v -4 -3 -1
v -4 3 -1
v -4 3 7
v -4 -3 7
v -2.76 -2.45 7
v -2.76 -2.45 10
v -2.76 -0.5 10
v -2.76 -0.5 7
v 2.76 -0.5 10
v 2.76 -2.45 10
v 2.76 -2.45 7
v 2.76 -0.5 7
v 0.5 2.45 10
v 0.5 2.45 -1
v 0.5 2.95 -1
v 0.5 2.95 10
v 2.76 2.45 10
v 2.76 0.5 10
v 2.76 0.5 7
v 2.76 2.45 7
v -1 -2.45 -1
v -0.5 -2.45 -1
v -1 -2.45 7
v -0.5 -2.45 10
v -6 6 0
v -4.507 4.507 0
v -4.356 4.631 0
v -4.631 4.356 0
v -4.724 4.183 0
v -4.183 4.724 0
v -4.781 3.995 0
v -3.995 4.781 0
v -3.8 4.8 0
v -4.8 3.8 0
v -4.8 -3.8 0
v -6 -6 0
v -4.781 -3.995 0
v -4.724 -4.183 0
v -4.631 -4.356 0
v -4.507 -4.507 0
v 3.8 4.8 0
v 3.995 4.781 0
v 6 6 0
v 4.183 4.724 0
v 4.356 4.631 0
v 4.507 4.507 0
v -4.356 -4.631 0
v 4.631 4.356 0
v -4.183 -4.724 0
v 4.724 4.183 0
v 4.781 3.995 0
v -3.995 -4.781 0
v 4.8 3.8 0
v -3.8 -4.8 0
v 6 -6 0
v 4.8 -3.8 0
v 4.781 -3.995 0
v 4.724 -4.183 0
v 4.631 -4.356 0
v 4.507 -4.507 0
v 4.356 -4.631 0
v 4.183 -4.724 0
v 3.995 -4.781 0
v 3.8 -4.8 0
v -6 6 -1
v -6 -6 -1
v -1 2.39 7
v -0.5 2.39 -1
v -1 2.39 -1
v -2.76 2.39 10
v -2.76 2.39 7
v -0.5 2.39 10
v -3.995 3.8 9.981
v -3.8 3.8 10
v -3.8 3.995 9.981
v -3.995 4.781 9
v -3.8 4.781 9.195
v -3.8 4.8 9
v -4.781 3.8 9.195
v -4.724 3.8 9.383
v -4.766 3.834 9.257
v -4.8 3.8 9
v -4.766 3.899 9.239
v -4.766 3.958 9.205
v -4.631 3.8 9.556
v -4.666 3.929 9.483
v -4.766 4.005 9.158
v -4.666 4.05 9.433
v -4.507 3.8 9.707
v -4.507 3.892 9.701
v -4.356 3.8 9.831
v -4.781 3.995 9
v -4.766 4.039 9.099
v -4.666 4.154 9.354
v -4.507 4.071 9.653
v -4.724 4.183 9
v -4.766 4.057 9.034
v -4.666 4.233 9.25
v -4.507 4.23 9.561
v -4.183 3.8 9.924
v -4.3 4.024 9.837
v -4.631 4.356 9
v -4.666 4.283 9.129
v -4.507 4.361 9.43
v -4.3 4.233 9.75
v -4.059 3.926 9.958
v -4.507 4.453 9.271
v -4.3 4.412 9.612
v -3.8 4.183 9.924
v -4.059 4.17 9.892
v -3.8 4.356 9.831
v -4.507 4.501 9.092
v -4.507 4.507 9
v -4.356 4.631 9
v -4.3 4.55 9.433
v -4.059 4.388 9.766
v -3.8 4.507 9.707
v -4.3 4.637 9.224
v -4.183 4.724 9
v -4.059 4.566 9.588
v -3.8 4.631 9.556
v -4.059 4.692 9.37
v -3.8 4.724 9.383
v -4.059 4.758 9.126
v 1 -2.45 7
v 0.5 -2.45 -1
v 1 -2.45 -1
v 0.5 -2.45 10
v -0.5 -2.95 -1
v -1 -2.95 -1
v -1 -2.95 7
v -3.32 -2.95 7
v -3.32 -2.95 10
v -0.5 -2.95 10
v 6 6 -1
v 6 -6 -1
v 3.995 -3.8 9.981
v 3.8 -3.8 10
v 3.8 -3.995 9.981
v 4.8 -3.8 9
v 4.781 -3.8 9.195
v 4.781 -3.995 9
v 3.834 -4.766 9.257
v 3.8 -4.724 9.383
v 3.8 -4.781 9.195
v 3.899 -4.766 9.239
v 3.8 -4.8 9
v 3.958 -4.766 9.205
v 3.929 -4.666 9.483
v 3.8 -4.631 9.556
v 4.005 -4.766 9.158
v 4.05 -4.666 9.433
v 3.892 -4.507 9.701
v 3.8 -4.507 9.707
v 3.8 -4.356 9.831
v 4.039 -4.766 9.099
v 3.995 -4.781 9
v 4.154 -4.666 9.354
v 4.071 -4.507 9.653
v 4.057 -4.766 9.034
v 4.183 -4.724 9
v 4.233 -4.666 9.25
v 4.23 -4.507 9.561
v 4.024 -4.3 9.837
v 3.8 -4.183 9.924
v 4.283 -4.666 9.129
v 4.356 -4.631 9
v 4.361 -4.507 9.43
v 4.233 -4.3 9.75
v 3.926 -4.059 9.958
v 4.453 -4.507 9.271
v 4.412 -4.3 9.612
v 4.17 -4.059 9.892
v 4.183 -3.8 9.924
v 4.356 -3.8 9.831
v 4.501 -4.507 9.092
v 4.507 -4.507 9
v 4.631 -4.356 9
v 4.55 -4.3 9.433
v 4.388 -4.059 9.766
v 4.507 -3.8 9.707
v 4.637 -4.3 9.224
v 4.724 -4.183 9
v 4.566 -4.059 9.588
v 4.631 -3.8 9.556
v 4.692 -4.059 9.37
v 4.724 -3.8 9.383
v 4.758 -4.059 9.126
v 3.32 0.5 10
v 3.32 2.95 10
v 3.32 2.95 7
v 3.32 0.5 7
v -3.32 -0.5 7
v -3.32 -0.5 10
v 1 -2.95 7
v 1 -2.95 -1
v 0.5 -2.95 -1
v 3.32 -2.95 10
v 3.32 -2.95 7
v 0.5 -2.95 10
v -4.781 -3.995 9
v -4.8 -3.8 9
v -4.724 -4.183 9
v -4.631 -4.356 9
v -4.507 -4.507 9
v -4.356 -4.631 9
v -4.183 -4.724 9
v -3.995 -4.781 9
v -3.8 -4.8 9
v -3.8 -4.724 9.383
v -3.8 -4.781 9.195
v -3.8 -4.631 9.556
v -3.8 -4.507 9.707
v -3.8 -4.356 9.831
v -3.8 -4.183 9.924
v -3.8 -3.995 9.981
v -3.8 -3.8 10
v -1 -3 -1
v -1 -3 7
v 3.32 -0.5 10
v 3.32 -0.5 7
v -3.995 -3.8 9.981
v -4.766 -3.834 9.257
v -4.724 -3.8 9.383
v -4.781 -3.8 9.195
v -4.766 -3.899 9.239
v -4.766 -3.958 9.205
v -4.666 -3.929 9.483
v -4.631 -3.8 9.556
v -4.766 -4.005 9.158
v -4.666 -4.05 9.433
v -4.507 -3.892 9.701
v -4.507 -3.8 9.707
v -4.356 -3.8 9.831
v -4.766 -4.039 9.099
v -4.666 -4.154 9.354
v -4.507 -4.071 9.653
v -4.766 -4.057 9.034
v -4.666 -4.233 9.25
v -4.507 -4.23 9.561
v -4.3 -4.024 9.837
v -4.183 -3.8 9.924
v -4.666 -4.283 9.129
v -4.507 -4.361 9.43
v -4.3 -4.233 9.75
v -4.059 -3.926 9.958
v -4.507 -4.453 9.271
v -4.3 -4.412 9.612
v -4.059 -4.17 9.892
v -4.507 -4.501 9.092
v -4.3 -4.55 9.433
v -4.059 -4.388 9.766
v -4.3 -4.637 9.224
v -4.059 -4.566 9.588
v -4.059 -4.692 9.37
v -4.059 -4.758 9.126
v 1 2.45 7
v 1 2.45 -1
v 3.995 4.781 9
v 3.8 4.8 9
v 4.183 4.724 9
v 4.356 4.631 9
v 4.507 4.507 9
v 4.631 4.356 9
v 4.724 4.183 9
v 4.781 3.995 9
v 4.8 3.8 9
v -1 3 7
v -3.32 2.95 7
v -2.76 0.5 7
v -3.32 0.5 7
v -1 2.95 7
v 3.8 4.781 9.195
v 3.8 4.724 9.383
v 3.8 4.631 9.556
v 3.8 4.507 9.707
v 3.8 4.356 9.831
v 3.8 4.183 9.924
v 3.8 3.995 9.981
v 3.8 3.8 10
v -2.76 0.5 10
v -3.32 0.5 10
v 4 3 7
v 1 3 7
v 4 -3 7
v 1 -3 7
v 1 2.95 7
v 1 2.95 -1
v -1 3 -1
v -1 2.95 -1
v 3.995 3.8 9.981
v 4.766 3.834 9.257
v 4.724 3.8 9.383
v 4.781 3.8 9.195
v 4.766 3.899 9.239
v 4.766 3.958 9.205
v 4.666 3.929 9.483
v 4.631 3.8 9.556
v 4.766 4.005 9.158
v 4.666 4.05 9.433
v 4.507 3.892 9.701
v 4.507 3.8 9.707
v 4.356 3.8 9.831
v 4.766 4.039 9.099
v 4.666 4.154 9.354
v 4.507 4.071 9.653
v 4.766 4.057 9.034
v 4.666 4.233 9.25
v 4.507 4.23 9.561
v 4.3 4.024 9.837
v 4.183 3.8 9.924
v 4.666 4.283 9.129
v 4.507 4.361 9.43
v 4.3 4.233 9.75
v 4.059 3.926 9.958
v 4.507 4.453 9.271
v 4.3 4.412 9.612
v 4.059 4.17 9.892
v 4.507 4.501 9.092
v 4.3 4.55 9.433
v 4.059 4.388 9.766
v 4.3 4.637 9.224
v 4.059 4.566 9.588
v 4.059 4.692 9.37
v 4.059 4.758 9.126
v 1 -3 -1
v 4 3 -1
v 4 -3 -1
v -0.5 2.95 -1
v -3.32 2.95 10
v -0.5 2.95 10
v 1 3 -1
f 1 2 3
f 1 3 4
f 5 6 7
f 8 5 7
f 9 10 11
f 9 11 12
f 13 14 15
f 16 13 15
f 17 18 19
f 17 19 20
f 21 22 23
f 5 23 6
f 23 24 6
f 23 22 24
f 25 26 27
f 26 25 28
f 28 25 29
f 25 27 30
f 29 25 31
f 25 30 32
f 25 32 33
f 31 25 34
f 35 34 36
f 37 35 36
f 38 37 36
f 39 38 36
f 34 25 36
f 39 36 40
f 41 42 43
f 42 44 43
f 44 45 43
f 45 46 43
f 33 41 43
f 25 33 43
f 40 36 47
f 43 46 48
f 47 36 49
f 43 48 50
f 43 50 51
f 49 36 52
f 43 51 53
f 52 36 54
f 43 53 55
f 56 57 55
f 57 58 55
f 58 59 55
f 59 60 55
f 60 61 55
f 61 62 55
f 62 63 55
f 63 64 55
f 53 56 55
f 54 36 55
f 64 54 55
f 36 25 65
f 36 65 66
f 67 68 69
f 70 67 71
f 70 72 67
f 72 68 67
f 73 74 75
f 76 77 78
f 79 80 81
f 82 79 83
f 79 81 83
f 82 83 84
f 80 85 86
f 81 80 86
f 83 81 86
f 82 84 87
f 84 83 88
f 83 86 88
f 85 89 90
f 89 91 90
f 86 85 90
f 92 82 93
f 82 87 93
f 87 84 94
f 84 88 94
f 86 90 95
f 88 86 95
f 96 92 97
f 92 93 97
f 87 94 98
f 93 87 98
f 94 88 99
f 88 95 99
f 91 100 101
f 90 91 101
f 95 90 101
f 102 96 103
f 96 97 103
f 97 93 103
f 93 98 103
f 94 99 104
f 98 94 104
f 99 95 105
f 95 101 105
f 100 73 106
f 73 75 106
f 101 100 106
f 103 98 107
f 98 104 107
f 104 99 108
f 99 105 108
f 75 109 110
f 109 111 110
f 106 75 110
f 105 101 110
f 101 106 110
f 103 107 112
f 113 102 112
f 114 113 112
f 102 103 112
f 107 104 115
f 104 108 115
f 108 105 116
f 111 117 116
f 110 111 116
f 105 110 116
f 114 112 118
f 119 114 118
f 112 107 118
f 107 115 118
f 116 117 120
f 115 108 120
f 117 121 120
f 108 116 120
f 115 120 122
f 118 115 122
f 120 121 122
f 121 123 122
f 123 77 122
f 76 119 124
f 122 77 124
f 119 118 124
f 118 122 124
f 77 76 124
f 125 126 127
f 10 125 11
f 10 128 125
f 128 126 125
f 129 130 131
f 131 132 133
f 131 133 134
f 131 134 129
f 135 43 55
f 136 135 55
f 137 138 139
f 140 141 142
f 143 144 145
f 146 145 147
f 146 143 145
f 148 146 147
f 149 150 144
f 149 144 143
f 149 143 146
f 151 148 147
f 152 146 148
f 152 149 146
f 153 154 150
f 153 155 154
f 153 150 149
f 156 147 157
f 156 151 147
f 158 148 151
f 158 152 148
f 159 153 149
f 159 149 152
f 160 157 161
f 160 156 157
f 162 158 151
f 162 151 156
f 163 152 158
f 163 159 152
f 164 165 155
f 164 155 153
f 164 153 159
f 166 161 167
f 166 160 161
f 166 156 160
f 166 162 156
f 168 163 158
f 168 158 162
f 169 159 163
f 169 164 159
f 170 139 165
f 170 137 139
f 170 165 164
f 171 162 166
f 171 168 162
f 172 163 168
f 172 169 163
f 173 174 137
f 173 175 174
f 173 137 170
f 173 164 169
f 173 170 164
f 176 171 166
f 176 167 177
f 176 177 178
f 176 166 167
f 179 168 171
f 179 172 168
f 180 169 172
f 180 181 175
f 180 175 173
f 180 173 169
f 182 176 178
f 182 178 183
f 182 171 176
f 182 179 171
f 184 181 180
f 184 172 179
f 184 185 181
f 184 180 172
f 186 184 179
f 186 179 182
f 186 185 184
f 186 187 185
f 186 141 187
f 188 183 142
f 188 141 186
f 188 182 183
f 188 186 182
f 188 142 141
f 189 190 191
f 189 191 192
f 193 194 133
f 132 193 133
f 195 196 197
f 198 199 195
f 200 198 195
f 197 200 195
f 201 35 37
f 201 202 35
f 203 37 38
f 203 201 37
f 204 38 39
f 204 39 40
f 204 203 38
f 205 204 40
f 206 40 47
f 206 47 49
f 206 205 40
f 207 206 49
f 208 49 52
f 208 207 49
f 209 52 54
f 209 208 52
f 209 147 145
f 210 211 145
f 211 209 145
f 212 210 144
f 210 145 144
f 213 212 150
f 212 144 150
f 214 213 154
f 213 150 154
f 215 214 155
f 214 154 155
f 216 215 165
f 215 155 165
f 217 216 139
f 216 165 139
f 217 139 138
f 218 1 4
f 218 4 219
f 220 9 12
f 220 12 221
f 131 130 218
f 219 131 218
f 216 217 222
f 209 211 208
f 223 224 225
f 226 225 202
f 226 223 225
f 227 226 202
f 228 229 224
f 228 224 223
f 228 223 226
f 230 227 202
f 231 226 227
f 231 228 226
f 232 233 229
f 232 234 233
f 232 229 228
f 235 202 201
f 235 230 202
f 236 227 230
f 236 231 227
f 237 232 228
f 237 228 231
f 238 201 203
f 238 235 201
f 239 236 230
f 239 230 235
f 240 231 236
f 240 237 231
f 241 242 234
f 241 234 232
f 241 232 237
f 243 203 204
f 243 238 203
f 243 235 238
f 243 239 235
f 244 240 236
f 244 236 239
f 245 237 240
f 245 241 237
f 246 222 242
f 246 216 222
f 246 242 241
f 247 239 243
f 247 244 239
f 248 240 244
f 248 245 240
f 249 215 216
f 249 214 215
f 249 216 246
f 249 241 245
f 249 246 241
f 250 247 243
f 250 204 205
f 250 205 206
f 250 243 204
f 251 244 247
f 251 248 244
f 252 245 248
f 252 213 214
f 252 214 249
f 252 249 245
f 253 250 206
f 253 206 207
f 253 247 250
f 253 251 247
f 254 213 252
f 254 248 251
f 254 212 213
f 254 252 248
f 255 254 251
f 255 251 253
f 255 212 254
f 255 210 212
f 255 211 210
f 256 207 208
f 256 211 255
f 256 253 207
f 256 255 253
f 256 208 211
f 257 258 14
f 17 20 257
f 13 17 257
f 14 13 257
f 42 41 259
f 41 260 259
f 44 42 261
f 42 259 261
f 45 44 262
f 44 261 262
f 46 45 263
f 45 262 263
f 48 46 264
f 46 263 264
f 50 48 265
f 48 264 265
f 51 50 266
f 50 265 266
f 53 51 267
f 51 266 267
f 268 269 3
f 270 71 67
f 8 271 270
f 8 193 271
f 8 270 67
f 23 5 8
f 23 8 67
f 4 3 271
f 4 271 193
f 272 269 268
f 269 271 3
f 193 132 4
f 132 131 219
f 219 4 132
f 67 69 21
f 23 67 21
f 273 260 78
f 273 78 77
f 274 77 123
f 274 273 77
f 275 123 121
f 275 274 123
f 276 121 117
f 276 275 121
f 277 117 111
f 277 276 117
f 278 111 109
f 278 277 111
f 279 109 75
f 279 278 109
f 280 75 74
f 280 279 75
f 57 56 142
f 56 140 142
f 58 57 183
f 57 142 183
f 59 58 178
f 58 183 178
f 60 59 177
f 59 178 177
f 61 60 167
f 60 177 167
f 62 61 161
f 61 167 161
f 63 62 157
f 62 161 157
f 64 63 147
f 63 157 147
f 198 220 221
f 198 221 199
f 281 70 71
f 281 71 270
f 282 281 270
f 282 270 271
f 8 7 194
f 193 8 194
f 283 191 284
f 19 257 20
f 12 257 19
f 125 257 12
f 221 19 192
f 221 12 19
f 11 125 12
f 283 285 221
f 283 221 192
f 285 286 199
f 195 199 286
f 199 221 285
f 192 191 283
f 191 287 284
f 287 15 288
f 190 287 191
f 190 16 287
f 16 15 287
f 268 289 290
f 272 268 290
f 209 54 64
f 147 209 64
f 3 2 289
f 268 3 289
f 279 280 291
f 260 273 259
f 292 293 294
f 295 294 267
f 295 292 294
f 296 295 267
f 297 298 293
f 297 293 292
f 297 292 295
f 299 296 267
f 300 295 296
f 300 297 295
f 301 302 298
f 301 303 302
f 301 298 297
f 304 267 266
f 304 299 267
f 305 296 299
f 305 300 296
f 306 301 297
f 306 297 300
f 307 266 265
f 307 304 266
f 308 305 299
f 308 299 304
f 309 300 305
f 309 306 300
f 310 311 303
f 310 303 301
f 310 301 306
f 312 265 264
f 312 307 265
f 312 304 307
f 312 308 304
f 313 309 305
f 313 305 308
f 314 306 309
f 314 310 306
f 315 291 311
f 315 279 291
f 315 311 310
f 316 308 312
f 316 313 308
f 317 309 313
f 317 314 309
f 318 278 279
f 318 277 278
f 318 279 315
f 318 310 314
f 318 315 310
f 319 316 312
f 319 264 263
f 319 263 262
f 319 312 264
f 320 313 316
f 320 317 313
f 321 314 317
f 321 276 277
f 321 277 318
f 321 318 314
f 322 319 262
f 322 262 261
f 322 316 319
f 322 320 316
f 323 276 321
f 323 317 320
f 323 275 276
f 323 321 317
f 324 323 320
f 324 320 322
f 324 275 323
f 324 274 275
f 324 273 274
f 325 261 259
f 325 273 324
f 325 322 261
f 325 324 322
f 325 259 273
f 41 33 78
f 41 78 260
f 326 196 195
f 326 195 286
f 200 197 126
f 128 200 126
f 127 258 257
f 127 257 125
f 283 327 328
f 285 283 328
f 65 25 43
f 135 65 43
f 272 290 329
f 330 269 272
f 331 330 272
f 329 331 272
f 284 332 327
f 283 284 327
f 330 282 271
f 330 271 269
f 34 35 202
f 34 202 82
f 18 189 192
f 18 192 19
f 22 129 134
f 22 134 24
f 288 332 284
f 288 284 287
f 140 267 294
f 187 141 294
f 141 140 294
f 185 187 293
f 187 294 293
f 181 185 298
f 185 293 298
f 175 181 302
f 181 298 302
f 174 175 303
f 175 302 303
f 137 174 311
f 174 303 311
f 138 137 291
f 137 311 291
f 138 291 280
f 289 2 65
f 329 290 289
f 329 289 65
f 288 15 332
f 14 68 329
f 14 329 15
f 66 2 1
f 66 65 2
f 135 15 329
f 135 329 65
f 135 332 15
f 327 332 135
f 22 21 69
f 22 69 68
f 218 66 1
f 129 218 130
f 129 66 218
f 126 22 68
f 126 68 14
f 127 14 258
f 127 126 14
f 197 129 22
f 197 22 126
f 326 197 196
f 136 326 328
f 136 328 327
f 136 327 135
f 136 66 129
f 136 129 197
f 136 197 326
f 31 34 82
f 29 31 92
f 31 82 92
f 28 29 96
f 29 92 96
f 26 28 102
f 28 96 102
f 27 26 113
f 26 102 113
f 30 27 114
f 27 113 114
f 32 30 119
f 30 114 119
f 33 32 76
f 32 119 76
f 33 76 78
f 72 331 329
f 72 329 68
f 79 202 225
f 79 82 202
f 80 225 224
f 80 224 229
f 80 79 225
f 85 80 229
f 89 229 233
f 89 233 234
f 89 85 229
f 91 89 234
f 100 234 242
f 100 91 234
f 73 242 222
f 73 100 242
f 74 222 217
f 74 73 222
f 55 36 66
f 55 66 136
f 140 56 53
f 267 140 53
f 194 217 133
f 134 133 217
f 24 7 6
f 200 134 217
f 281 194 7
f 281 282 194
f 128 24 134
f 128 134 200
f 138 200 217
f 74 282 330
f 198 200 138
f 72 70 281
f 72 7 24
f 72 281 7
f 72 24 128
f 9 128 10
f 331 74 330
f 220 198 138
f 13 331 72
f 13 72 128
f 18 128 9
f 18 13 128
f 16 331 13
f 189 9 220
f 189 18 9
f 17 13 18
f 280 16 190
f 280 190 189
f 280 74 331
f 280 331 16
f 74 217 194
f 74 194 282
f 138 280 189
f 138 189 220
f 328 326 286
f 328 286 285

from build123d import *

# Parameters (mm, degrees)
SKETCH_W        = 9.6
SKETCH_H        = 9.6
PAD_DEPTH       = 10
SKETCH002_W     = 12
SKETCH002_H     = 12
PAD001_DEPTH    = 1
SKETCH003_W     = 3
SKETCH003_H     = 6
POCKET_DEPTH    = 9
SKETCH004_W     = 3
SKETCH004_H     = 6
POCKET001_DEPTH = 9
POCKET002_DEPTH = 11.001
POCKET003_DEPTH = 11.001
POCKET004_DEPTH = 11.001
POCKET005_DEPTH = 11.001
FILLET_R        = 1


with BuildPart() as part:
    # Sketch → Pad (new body)
    with BuildSketch(Plane.XY):
        Rectangle(SKETCH_W, SKETCH_H)
    extrude(amount=PAD_DEPTH)

    # Sketch002 → Pad001 (join)
    with BuildSketch(Plane(origin=(0, 0, 0), x_dir=(1, 0, 0), z_dir=(0, 0, -1))):
        Rectangle(SKETCH002_W, SKETCH002_H)
    extrude(amount=PAD001_DEPTH)

    # Sketch003 → Pocket (cut)
    with BuildSketch(Plane(origin=(0, 0, -2), x_dir=(1, 0, 0), z_dir=(0, 0, -1))):
        with Locations((-2.5, 0)):
            Rectangle(SKETCH003_W, SKETCH003_H)
    extrude(amount=-POCKET_DEPTH, mode=Mode.SUBTRACT)

    # Sketch004 → Pocket001 (cut)
    with BuildSketch(Plane(origin=(0, 0, -2), x_dir=(1, 0, 0), z_dir=(0, 0, -1))):
        with Locations((2.5, 0)):
            Rectangle(SKETCH004_W, SKETCH004_H)
    extrude(amount=-POCKET001_DEPTH, mode=Mode.SUBTRACT)

    # Sketch001 → Pocket002 (cut, through all)
    with BuildSketch(Plane.XY.offset(10)):
        Polygon((3.32, -0.5), (3.32, -2.95), (0.5, -2.95), (0.5, -2.45), (2.76, -2.45), (2.76, -0.5), align=None)
    extrude(amount=-POCKET002_DEPTH, mode=Mode.SUBTRACT)

    # Sketch005 → Pocket003 (cut, through all)
    with BuildSketch(Plane.XY.offset(10)):
        Polygon((-3.32, -0.5), (-3.32, -2.95), (-0.5, -2.95), (-0.5, -2.45), (-2.76, -2.45), (-2.76, -0.5), align=None)
    extrude(amount=-POCKET003_DEPTH, mode=Mode.SUBTRACT)

    # Sketch007 → Pocket004 (cut, through all)
    with BuildSketch(Plane.XY.offset(10)):
        Polygon((-2.76, 0.5), (-3.32, 0.5), (-3.32, 2.95), (-0.5, 2.95), (-0.5, 2.39), (-2.76, 2.39), align=None)
    extrude(amount=-POCKET004_DEPTH, mode=Mode.SUBTRACT)

    # Sketch006 → Pocket005 (cut, through all)
    with BuildSketch(Plane.XY.offset(10)):
        Polygon((0.5, 2.95), (3.32, 2.95), (3.32, 0.5), (2.76, 0.5), (2.76, 2.45), (0.5, 2.45), align=None)
    extrude(amount=-POCKET005_DEPTH, mode=Mode.SUBTRACT)

    # Fillet
    fillet_edges = [part.edges().sort_by_distance(p)[0] for p in [
        (0, 4.8, 10),
        (4.8, 0, 10),
        (0, -4.8, 10),
        (4.8, -4.8, 5),
        (4.8, 4.8, 5),
        (-4.8, 0, 10),
        (-4.8, -4.8, 5),
        (-4.8, 4.8, 5),
    ]]
    fillet(fillet_edges, radius=FILLET_R)


solid = part.part
